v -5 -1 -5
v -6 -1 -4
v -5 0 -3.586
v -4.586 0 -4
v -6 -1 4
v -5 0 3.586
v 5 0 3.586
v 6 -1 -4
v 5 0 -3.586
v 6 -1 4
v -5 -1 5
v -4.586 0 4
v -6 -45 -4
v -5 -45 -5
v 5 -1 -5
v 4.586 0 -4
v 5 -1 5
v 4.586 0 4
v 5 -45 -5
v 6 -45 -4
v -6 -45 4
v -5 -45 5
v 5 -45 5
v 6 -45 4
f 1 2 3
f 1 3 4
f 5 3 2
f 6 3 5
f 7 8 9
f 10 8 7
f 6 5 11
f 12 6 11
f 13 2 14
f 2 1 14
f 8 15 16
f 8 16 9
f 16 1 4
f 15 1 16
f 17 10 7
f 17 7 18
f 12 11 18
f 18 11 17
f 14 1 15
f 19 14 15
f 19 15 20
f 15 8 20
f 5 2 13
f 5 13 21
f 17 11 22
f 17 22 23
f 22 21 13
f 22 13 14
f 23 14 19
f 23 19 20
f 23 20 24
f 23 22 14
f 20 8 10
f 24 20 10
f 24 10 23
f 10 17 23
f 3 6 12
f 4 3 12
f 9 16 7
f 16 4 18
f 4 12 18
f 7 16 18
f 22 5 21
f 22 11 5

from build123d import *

# Parameters (mm, degrees)
F0_W     = 12
F0_H     = 10
F1_DEPTH = 45
F2_SIZE  = 1
F3_SIZE  = 1


with BuildPart() as f1:
    # F0 (on Front) → F1 (new body)
    with BuildSketch(Plane.XZ):
        Rectangle(F0_W, F0_H)
    extrude(amount=F1_DEPTH)

    # F2
    f2_edges = [f1.edges().sort_by_distance(p)[0] for p in [
        (6, -22.5, 5),
        (-6, -22.5, 5),
        (6, -22.5, -5),
        (-6, -22.5, -5),
    ]]
    chamfer(f2_edges, length=F2_SIZE)

    # F3
    f3_edges = [f1.edges().sort_by_distance(p)[0] for p in [
        (0, 0, -5),
        (-5.5, 0, -4.5),
        (5.5, 0, -4.5),
        (-6, 0, 0),
        (6, 0, 0),
        (-5.5, 0, 4.5),
        (5.5, 0, 4.5),
        (0, 0, 5),
    ]]
    chamfer(f3_edges, length=F3_SIZE)


solid = f1.part
